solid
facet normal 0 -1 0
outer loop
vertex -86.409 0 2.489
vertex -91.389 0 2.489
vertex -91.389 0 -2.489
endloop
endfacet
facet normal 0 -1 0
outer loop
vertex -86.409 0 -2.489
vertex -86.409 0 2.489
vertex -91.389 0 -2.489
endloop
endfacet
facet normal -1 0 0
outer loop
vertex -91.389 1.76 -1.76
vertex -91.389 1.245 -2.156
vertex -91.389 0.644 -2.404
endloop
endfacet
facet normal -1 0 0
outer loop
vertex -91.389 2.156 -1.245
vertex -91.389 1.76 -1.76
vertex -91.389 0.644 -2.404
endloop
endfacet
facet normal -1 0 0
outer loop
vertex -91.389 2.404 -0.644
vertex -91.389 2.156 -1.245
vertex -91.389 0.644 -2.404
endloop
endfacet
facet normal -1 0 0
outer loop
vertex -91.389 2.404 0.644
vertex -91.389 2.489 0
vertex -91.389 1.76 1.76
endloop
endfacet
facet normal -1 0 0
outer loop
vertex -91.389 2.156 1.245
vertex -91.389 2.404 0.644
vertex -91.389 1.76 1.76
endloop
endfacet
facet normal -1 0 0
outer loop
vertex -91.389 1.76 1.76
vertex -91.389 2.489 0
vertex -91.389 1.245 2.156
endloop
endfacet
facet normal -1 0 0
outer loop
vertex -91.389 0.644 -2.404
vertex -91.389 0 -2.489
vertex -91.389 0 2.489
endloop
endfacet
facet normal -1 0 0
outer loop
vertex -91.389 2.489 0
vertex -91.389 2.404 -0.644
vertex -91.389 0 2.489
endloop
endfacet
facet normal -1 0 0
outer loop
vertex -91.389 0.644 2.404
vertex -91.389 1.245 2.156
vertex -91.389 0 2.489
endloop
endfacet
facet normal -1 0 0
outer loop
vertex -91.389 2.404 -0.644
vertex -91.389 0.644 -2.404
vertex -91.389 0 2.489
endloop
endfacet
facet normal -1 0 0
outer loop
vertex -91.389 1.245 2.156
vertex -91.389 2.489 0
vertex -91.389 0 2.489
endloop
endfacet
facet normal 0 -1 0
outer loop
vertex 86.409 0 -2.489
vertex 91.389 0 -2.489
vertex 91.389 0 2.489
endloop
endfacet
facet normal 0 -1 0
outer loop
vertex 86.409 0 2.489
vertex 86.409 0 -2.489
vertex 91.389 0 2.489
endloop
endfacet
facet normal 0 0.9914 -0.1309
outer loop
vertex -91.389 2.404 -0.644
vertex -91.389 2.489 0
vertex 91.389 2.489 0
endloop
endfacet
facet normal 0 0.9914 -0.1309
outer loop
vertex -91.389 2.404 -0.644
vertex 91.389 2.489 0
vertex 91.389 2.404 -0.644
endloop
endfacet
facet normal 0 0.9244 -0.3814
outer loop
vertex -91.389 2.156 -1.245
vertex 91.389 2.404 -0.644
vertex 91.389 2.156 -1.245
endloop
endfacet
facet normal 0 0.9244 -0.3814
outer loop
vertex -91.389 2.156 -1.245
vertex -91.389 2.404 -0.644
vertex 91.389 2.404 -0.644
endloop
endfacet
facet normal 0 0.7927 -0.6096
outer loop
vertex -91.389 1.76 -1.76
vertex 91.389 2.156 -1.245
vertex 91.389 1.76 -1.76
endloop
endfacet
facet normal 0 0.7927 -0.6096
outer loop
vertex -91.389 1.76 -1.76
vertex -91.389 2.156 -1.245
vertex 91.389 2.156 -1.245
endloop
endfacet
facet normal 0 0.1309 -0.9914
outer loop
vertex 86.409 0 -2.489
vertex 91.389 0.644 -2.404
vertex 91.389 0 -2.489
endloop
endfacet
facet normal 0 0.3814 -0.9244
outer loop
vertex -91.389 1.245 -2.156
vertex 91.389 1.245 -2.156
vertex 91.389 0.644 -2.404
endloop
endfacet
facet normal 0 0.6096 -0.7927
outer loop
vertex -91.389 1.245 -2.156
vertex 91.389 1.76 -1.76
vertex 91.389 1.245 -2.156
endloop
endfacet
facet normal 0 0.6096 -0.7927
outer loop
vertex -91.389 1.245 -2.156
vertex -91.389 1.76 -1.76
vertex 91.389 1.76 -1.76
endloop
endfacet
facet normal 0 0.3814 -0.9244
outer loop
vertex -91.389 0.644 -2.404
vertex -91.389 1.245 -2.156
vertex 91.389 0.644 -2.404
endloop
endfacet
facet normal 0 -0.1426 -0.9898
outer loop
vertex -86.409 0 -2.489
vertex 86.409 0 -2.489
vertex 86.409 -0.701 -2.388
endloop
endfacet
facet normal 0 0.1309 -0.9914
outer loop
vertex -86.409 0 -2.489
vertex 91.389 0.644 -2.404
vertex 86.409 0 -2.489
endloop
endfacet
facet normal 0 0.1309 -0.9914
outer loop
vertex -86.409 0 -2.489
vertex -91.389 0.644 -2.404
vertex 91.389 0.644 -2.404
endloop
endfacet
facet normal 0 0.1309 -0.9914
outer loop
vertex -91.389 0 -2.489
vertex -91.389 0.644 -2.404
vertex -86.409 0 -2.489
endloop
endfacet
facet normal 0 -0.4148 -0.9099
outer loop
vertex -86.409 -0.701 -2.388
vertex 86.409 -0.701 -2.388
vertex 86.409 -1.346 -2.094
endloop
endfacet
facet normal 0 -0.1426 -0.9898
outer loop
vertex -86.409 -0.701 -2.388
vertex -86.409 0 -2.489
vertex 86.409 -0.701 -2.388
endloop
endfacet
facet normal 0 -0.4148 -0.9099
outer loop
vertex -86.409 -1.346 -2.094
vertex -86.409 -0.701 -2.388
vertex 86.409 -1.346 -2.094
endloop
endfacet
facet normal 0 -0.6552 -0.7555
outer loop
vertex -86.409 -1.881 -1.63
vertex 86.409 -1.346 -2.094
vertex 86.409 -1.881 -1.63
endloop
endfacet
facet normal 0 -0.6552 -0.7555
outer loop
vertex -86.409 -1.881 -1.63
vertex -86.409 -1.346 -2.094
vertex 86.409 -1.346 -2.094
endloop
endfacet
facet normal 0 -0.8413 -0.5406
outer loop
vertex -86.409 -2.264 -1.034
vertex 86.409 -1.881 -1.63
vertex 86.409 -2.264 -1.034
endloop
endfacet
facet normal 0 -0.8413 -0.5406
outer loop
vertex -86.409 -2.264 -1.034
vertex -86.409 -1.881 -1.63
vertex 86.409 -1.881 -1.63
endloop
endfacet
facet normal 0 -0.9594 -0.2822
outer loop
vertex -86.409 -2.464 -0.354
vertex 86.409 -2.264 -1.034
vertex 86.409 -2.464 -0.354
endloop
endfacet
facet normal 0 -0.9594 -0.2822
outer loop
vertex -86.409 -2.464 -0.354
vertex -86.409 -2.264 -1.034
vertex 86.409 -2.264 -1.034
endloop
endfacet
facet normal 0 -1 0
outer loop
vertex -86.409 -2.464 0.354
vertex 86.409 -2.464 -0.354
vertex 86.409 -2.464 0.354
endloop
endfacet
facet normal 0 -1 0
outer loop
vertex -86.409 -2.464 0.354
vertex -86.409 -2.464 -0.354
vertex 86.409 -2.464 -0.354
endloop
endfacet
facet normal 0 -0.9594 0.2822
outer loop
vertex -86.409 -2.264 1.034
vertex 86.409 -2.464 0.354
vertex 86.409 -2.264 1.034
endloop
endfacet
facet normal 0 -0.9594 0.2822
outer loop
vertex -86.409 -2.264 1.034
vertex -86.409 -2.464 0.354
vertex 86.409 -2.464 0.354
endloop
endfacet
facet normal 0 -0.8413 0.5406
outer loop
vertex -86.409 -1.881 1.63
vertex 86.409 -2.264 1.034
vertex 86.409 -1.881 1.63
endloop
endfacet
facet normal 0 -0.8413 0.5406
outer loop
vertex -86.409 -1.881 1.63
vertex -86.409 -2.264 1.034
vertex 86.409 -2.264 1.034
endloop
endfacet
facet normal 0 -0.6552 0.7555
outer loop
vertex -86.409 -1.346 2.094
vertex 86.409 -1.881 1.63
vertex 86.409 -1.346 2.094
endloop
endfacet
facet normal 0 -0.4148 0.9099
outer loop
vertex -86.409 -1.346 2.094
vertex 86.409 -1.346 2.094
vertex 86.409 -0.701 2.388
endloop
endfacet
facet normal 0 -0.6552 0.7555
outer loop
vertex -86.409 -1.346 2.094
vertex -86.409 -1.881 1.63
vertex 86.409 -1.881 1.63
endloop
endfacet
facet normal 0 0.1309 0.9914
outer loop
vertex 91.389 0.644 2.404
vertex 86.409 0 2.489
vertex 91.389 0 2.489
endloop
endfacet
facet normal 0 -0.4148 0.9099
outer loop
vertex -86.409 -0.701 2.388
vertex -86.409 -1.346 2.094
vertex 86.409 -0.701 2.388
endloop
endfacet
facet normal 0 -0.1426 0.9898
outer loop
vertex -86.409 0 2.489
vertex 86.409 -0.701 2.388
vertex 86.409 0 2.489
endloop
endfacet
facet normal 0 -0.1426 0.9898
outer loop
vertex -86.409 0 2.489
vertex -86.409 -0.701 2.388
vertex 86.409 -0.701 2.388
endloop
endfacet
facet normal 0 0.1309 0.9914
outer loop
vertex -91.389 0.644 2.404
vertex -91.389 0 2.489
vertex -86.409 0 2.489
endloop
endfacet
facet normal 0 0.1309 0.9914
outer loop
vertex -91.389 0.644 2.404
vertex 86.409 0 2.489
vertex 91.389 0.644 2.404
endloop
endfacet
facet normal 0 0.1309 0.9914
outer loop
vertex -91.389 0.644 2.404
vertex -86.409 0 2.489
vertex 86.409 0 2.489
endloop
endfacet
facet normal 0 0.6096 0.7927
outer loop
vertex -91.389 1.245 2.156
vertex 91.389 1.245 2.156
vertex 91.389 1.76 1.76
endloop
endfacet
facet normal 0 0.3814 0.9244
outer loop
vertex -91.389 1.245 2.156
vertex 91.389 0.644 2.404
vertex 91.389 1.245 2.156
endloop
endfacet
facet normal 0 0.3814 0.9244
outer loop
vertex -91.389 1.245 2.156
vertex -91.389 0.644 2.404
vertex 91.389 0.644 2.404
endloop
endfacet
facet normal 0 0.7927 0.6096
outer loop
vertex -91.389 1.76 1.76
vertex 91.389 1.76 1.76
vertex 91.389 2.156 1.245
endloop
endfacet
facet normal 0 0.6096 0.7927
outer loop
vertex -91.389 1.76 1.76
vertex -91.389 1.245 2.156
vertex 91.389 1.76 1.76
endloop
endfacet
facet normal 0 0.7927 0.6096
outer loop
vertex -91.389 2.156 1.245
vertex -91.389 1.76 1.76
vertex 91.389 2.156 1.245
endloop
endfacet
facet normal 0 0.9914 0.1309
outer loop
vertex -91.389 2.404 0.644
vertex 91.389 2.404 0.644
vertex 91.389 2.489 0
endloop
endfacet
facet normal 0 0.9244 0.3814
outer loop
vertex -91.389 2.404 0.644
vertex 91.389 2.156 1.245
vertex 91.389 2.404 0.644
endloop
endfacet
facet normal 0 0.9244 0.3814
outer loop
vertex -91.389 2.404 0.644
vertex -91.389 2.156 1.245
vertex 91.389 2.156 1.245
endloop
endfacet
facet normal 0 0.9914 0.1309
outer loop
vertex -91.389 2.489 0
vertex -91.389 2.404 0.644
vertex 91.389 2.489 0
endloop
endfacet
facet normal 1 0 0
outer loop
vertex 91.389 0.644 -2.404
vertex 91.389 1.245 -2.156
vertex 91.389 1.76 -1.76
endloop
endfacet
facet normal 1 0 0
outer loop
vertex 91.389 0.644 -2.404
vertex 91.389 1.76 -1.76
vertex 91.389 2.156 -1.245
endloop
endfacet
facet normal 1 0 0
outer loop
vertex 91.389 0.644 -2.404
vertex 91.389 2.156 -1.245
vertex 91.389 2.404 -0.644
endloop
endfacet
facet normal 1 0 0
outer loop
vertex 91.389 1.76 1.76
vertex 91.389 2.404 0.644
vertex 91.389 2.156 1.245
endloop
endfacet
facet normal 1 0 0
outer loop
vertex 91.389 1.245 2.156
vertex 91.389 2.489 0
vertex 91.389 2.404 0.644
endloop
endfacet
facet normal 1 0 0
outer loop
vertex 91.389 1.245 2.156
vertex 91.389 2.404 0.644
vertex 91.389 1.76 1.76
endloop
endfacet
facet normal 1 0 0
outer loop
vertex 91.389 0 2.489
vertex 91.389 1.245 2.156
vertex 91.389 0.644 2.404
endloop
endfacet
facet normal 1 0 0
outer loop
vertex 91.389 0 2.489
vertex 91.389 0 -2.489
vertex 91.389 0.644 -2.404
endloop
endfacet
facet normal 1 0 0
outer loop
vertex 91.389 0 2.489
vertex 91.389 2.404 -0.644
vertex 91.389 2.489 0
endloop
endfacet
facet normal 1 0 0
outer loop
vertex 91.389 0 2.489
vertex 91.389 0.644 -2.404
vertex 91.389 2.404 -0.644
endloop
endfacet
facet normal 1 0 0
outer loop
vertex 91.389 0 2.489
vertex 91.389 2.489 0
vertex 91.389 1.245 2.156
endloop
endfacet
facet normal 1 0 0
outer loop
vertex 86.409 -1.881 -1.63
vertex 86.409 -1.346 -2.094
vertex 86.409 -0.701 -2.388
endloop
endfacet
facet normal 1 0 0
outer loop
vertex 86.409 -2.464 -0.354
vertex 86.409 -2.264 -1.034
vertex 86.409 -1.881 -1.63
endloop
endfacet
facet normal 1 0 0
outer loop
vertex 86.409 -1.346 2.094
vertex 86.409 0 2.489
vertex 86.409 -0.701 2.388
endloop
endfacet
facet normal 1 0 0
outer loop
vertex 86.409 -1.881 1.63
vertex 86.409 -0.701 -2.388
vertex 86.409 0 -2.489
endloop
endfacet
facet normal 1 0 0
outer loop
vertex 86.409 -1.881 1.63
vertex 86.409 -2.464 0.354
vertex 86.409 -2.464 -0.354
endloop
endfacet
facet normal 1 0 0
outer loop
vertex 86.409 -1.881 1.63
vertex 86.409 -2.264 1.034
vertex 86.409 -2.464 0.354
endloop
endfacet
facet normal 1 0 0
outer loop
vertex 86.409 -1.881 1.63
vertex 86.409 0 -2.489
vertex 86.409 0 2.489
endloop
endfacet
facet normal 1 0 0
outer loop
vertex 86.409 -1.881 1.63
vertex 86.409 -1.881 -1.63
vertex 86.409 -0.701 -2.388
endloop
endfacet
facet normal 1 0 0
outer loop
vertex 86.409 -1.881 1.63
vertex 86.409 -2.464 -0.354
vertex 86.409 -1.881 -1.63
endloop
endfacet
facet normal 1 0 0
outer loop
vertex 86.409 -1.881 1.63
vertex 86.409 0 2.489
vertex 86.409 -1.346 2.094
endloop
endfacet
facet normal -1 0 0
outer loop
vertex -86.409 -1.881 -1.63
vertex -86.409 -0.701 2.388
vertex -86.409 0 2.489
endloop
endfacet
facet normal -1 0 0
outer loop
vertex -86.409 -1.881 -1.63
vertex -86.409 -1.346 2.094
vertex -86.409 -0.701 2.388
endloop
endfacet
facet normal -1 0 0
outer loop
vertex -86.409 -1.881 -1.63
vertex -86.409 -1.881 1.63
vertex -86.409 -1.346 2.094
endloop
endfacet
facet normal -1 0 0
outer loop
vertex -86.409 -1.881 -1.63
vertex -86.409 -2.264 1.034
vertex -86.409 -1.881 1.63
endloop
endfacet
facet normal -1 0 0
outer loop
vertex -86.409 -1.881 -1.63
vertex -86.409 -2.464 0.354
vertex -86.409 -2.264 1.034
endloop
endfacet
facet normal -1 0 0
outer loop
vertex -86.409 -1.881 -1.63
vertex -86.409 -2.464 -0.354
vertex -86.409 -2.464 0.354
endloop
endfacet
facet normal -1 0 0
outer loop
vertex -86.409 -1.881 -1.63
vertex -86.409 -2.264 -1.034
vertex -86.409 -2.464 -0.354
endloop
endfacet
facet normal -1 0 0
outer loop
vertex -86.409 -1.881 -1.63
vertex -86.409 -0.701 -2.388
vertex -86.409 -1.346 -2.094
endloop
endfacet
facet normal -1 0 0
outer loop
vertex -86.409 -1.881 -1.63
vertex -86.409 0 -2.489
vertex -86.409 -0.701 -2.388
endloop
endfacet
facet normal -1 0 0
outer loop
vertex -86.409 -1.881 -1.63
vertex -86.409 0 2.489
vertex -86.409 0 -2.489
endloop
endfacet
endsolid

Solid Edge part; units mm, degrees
sketch "Sketch1" plane through (0, 0, 0) normal (1, 0, 0) x (0, 1, 0)
  circle A0 centre (0, 0) radius 2.4892
extrude "Protrusion1" add sketch "Sketch1" along normal mid plane 182.7784
sketch "Sketch2" plane through (0, -2.4892, 0) normal (0, -1, 0) x (1, 0, 0)
  line L0 (91.3892, 2.4892) -> (91.3892, -2.4892)
  line L1 (91.3892, -2.4892) -> (86.4092, -2.4892)
  line L2 (86.4092, -2.4892) -> (86.4092, 2.4892)
  line L3 (86.4092, 2.4892) -> (91.3892, 2.4892)
extrude "ExtrudedCutout_1" cut sketch "Sketch2" against normal blind 2.4892
mirror "Mirror1" about plane through (0, 0, 0) normal (1, 0, 0) of "ExtrudedCutout_1"
properties material "Wood, Pine"
